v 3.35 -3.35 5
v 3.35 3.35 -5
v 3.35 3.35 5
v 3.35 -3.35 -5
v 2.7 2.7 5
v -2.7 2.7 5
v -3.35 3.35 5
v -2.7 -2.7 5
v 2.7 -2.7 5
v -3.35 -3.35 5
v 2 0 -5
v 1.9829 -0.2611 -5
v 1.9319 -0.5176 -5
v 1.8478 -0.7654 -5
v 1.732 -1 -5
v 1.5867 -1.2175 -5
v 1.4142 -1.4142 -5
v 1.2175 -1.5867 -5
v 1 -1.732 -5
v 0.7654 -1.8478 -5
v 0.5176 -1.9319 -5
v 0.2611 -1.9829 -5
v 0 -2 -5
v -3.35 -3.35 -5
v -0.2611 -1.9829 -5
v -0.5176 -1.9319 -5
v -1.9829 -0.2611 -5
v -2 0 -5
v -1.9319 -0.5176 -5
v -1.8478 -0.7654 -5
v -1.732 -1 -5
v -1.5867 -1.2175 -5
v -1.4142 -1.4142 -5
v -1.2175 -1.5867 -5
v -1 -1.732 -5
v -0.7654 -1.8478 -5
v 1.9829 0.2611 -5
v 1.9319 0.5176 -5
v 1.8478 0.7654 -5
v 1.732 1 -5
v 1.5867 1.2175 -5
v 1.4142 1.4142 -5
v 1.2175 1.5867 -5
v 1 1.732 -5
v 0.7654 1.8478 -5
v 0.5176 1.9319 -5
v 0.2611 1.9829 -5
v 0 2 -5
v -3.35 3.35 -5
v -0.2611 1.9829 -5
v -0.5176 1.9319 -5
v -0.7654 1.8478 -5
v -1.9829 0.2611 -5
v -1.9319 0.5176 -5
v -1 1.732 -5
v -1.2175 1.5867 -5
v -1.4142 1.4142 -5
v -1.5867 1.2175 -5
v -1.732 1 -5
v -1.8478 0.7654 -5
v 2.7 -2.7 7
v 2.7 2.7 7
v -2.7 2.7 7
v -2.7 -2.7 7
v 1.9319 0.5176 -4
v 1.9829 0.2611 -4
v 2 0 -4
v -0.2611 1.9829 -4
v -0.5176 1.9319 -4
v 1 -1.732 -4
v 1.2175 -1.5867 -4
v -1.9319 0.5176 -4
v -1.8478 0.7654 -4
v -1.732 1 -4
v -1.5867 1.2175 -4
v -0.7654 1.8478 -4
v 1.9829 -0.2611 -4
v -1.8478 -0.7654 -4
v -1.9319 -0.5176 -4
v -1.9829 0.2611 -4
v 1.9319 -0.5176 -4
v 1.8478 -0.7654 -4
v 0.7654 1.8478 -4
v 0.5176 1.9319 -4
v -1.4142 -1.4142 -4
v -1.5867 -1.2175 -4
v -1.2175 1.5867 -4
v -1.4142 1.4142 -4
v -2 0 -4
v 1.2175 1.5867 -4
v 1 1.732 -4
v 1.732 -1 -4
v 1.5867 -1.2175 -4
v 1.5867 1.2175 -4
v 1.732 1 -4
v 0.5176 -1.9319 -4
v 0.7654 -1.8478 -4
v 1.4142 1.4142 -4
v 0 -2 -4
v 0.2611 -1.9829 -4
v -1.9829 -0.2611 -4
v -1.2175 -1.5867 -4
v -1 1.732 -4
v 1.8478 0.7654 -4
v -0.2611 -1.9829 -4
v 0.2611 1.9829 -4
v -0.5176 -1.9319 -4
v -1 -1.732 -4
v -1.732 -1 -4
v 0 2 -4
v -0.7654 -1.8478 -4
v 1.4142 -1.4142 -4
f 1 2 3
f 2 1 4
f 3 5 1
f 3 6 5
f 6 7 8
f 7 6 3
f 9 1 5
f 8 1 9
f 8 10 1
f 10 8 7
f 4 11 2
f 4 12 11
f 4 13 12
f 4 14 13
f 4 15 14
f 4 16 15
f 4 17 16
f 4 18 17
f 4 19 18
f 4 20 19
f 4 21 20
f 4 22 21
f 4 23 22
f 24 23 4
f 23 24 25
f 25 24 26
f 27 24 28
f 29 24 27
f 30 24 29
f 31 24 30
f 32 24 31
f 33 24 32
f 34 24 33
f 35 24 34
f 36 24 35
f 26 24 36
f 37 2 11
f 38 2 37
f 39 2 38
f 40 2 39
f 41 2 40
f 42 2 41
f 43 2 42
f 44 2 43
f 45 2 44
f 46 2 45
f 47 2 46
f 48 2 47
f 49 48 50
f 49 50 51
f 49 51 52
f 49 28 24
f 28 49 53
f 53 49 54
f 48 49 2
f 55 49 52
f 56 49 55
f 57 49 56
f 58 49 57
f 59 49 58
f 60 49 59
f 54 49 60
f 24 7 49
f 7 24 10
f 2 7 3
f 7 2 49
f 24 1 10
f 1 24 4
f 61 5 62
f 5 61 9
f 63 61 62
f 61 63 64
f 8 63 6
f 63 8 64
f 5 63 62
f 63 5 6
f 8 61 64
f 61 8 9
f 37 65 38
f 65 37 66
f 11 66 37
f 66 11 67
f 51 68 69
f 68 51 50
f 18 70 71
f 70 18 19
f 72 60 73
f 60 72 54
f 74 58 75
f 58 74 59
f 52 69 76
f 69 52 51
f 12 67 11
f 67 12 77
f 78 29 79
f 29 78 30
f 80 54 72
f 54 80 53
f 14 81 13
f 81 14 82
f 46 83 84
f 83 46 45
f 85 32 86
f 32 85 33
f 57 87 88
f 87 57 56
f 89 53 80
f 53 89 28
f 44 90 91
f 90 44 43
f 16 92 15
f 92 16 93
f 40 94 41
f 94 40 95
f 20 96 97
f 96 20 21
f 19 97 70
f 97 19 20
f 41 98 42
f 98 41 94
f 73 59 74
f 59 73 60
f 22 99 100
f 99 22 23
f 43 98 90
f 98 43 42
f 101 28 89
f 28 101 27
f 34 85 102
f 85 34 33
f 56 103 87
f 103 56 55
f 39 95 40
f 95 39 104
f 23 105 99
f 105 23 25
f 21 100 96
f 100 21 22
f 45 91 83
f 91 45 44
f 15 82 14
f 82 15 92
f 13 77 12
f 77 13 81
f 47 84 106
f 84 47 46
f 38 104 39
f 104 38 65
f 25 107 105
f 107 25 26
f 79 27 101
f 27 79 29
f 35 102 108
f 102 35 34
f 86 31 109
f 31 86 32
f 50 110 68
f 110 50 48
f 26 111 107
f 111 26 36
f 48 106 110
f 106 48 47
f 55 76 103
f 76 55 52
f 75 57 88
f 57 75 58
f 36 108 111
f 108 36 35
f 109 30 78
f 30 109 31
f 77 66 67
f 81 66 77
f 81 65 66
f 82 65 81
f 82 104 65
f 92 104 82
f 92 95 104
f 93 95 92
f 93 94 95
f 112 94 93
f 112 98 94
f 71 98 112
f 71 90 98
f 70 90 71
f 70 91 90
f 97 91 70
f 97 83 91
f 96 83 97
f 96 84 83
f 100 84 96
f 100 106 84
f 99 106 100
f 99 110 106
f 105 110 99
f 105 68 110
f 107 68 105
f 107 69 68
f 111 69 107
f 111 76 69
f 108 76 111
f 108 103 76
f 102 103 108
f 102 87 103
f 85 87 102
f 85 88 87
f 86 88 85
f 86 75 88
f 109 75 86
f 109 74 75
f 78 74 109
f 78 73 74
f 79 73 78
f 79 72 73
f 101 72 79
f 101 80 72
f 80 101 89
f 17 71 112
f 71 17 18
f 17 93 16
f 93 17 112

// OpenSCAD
$fn = $preview?16:48;

difference()
{
union() {cube([6.7, 6.7, 10],center=true);
translate([0,0,6]) cube([5.4,5.4,2],center=true);}
translate([0,0,-4.5]) cylinder(h=1,r=2,center=true);
} 
